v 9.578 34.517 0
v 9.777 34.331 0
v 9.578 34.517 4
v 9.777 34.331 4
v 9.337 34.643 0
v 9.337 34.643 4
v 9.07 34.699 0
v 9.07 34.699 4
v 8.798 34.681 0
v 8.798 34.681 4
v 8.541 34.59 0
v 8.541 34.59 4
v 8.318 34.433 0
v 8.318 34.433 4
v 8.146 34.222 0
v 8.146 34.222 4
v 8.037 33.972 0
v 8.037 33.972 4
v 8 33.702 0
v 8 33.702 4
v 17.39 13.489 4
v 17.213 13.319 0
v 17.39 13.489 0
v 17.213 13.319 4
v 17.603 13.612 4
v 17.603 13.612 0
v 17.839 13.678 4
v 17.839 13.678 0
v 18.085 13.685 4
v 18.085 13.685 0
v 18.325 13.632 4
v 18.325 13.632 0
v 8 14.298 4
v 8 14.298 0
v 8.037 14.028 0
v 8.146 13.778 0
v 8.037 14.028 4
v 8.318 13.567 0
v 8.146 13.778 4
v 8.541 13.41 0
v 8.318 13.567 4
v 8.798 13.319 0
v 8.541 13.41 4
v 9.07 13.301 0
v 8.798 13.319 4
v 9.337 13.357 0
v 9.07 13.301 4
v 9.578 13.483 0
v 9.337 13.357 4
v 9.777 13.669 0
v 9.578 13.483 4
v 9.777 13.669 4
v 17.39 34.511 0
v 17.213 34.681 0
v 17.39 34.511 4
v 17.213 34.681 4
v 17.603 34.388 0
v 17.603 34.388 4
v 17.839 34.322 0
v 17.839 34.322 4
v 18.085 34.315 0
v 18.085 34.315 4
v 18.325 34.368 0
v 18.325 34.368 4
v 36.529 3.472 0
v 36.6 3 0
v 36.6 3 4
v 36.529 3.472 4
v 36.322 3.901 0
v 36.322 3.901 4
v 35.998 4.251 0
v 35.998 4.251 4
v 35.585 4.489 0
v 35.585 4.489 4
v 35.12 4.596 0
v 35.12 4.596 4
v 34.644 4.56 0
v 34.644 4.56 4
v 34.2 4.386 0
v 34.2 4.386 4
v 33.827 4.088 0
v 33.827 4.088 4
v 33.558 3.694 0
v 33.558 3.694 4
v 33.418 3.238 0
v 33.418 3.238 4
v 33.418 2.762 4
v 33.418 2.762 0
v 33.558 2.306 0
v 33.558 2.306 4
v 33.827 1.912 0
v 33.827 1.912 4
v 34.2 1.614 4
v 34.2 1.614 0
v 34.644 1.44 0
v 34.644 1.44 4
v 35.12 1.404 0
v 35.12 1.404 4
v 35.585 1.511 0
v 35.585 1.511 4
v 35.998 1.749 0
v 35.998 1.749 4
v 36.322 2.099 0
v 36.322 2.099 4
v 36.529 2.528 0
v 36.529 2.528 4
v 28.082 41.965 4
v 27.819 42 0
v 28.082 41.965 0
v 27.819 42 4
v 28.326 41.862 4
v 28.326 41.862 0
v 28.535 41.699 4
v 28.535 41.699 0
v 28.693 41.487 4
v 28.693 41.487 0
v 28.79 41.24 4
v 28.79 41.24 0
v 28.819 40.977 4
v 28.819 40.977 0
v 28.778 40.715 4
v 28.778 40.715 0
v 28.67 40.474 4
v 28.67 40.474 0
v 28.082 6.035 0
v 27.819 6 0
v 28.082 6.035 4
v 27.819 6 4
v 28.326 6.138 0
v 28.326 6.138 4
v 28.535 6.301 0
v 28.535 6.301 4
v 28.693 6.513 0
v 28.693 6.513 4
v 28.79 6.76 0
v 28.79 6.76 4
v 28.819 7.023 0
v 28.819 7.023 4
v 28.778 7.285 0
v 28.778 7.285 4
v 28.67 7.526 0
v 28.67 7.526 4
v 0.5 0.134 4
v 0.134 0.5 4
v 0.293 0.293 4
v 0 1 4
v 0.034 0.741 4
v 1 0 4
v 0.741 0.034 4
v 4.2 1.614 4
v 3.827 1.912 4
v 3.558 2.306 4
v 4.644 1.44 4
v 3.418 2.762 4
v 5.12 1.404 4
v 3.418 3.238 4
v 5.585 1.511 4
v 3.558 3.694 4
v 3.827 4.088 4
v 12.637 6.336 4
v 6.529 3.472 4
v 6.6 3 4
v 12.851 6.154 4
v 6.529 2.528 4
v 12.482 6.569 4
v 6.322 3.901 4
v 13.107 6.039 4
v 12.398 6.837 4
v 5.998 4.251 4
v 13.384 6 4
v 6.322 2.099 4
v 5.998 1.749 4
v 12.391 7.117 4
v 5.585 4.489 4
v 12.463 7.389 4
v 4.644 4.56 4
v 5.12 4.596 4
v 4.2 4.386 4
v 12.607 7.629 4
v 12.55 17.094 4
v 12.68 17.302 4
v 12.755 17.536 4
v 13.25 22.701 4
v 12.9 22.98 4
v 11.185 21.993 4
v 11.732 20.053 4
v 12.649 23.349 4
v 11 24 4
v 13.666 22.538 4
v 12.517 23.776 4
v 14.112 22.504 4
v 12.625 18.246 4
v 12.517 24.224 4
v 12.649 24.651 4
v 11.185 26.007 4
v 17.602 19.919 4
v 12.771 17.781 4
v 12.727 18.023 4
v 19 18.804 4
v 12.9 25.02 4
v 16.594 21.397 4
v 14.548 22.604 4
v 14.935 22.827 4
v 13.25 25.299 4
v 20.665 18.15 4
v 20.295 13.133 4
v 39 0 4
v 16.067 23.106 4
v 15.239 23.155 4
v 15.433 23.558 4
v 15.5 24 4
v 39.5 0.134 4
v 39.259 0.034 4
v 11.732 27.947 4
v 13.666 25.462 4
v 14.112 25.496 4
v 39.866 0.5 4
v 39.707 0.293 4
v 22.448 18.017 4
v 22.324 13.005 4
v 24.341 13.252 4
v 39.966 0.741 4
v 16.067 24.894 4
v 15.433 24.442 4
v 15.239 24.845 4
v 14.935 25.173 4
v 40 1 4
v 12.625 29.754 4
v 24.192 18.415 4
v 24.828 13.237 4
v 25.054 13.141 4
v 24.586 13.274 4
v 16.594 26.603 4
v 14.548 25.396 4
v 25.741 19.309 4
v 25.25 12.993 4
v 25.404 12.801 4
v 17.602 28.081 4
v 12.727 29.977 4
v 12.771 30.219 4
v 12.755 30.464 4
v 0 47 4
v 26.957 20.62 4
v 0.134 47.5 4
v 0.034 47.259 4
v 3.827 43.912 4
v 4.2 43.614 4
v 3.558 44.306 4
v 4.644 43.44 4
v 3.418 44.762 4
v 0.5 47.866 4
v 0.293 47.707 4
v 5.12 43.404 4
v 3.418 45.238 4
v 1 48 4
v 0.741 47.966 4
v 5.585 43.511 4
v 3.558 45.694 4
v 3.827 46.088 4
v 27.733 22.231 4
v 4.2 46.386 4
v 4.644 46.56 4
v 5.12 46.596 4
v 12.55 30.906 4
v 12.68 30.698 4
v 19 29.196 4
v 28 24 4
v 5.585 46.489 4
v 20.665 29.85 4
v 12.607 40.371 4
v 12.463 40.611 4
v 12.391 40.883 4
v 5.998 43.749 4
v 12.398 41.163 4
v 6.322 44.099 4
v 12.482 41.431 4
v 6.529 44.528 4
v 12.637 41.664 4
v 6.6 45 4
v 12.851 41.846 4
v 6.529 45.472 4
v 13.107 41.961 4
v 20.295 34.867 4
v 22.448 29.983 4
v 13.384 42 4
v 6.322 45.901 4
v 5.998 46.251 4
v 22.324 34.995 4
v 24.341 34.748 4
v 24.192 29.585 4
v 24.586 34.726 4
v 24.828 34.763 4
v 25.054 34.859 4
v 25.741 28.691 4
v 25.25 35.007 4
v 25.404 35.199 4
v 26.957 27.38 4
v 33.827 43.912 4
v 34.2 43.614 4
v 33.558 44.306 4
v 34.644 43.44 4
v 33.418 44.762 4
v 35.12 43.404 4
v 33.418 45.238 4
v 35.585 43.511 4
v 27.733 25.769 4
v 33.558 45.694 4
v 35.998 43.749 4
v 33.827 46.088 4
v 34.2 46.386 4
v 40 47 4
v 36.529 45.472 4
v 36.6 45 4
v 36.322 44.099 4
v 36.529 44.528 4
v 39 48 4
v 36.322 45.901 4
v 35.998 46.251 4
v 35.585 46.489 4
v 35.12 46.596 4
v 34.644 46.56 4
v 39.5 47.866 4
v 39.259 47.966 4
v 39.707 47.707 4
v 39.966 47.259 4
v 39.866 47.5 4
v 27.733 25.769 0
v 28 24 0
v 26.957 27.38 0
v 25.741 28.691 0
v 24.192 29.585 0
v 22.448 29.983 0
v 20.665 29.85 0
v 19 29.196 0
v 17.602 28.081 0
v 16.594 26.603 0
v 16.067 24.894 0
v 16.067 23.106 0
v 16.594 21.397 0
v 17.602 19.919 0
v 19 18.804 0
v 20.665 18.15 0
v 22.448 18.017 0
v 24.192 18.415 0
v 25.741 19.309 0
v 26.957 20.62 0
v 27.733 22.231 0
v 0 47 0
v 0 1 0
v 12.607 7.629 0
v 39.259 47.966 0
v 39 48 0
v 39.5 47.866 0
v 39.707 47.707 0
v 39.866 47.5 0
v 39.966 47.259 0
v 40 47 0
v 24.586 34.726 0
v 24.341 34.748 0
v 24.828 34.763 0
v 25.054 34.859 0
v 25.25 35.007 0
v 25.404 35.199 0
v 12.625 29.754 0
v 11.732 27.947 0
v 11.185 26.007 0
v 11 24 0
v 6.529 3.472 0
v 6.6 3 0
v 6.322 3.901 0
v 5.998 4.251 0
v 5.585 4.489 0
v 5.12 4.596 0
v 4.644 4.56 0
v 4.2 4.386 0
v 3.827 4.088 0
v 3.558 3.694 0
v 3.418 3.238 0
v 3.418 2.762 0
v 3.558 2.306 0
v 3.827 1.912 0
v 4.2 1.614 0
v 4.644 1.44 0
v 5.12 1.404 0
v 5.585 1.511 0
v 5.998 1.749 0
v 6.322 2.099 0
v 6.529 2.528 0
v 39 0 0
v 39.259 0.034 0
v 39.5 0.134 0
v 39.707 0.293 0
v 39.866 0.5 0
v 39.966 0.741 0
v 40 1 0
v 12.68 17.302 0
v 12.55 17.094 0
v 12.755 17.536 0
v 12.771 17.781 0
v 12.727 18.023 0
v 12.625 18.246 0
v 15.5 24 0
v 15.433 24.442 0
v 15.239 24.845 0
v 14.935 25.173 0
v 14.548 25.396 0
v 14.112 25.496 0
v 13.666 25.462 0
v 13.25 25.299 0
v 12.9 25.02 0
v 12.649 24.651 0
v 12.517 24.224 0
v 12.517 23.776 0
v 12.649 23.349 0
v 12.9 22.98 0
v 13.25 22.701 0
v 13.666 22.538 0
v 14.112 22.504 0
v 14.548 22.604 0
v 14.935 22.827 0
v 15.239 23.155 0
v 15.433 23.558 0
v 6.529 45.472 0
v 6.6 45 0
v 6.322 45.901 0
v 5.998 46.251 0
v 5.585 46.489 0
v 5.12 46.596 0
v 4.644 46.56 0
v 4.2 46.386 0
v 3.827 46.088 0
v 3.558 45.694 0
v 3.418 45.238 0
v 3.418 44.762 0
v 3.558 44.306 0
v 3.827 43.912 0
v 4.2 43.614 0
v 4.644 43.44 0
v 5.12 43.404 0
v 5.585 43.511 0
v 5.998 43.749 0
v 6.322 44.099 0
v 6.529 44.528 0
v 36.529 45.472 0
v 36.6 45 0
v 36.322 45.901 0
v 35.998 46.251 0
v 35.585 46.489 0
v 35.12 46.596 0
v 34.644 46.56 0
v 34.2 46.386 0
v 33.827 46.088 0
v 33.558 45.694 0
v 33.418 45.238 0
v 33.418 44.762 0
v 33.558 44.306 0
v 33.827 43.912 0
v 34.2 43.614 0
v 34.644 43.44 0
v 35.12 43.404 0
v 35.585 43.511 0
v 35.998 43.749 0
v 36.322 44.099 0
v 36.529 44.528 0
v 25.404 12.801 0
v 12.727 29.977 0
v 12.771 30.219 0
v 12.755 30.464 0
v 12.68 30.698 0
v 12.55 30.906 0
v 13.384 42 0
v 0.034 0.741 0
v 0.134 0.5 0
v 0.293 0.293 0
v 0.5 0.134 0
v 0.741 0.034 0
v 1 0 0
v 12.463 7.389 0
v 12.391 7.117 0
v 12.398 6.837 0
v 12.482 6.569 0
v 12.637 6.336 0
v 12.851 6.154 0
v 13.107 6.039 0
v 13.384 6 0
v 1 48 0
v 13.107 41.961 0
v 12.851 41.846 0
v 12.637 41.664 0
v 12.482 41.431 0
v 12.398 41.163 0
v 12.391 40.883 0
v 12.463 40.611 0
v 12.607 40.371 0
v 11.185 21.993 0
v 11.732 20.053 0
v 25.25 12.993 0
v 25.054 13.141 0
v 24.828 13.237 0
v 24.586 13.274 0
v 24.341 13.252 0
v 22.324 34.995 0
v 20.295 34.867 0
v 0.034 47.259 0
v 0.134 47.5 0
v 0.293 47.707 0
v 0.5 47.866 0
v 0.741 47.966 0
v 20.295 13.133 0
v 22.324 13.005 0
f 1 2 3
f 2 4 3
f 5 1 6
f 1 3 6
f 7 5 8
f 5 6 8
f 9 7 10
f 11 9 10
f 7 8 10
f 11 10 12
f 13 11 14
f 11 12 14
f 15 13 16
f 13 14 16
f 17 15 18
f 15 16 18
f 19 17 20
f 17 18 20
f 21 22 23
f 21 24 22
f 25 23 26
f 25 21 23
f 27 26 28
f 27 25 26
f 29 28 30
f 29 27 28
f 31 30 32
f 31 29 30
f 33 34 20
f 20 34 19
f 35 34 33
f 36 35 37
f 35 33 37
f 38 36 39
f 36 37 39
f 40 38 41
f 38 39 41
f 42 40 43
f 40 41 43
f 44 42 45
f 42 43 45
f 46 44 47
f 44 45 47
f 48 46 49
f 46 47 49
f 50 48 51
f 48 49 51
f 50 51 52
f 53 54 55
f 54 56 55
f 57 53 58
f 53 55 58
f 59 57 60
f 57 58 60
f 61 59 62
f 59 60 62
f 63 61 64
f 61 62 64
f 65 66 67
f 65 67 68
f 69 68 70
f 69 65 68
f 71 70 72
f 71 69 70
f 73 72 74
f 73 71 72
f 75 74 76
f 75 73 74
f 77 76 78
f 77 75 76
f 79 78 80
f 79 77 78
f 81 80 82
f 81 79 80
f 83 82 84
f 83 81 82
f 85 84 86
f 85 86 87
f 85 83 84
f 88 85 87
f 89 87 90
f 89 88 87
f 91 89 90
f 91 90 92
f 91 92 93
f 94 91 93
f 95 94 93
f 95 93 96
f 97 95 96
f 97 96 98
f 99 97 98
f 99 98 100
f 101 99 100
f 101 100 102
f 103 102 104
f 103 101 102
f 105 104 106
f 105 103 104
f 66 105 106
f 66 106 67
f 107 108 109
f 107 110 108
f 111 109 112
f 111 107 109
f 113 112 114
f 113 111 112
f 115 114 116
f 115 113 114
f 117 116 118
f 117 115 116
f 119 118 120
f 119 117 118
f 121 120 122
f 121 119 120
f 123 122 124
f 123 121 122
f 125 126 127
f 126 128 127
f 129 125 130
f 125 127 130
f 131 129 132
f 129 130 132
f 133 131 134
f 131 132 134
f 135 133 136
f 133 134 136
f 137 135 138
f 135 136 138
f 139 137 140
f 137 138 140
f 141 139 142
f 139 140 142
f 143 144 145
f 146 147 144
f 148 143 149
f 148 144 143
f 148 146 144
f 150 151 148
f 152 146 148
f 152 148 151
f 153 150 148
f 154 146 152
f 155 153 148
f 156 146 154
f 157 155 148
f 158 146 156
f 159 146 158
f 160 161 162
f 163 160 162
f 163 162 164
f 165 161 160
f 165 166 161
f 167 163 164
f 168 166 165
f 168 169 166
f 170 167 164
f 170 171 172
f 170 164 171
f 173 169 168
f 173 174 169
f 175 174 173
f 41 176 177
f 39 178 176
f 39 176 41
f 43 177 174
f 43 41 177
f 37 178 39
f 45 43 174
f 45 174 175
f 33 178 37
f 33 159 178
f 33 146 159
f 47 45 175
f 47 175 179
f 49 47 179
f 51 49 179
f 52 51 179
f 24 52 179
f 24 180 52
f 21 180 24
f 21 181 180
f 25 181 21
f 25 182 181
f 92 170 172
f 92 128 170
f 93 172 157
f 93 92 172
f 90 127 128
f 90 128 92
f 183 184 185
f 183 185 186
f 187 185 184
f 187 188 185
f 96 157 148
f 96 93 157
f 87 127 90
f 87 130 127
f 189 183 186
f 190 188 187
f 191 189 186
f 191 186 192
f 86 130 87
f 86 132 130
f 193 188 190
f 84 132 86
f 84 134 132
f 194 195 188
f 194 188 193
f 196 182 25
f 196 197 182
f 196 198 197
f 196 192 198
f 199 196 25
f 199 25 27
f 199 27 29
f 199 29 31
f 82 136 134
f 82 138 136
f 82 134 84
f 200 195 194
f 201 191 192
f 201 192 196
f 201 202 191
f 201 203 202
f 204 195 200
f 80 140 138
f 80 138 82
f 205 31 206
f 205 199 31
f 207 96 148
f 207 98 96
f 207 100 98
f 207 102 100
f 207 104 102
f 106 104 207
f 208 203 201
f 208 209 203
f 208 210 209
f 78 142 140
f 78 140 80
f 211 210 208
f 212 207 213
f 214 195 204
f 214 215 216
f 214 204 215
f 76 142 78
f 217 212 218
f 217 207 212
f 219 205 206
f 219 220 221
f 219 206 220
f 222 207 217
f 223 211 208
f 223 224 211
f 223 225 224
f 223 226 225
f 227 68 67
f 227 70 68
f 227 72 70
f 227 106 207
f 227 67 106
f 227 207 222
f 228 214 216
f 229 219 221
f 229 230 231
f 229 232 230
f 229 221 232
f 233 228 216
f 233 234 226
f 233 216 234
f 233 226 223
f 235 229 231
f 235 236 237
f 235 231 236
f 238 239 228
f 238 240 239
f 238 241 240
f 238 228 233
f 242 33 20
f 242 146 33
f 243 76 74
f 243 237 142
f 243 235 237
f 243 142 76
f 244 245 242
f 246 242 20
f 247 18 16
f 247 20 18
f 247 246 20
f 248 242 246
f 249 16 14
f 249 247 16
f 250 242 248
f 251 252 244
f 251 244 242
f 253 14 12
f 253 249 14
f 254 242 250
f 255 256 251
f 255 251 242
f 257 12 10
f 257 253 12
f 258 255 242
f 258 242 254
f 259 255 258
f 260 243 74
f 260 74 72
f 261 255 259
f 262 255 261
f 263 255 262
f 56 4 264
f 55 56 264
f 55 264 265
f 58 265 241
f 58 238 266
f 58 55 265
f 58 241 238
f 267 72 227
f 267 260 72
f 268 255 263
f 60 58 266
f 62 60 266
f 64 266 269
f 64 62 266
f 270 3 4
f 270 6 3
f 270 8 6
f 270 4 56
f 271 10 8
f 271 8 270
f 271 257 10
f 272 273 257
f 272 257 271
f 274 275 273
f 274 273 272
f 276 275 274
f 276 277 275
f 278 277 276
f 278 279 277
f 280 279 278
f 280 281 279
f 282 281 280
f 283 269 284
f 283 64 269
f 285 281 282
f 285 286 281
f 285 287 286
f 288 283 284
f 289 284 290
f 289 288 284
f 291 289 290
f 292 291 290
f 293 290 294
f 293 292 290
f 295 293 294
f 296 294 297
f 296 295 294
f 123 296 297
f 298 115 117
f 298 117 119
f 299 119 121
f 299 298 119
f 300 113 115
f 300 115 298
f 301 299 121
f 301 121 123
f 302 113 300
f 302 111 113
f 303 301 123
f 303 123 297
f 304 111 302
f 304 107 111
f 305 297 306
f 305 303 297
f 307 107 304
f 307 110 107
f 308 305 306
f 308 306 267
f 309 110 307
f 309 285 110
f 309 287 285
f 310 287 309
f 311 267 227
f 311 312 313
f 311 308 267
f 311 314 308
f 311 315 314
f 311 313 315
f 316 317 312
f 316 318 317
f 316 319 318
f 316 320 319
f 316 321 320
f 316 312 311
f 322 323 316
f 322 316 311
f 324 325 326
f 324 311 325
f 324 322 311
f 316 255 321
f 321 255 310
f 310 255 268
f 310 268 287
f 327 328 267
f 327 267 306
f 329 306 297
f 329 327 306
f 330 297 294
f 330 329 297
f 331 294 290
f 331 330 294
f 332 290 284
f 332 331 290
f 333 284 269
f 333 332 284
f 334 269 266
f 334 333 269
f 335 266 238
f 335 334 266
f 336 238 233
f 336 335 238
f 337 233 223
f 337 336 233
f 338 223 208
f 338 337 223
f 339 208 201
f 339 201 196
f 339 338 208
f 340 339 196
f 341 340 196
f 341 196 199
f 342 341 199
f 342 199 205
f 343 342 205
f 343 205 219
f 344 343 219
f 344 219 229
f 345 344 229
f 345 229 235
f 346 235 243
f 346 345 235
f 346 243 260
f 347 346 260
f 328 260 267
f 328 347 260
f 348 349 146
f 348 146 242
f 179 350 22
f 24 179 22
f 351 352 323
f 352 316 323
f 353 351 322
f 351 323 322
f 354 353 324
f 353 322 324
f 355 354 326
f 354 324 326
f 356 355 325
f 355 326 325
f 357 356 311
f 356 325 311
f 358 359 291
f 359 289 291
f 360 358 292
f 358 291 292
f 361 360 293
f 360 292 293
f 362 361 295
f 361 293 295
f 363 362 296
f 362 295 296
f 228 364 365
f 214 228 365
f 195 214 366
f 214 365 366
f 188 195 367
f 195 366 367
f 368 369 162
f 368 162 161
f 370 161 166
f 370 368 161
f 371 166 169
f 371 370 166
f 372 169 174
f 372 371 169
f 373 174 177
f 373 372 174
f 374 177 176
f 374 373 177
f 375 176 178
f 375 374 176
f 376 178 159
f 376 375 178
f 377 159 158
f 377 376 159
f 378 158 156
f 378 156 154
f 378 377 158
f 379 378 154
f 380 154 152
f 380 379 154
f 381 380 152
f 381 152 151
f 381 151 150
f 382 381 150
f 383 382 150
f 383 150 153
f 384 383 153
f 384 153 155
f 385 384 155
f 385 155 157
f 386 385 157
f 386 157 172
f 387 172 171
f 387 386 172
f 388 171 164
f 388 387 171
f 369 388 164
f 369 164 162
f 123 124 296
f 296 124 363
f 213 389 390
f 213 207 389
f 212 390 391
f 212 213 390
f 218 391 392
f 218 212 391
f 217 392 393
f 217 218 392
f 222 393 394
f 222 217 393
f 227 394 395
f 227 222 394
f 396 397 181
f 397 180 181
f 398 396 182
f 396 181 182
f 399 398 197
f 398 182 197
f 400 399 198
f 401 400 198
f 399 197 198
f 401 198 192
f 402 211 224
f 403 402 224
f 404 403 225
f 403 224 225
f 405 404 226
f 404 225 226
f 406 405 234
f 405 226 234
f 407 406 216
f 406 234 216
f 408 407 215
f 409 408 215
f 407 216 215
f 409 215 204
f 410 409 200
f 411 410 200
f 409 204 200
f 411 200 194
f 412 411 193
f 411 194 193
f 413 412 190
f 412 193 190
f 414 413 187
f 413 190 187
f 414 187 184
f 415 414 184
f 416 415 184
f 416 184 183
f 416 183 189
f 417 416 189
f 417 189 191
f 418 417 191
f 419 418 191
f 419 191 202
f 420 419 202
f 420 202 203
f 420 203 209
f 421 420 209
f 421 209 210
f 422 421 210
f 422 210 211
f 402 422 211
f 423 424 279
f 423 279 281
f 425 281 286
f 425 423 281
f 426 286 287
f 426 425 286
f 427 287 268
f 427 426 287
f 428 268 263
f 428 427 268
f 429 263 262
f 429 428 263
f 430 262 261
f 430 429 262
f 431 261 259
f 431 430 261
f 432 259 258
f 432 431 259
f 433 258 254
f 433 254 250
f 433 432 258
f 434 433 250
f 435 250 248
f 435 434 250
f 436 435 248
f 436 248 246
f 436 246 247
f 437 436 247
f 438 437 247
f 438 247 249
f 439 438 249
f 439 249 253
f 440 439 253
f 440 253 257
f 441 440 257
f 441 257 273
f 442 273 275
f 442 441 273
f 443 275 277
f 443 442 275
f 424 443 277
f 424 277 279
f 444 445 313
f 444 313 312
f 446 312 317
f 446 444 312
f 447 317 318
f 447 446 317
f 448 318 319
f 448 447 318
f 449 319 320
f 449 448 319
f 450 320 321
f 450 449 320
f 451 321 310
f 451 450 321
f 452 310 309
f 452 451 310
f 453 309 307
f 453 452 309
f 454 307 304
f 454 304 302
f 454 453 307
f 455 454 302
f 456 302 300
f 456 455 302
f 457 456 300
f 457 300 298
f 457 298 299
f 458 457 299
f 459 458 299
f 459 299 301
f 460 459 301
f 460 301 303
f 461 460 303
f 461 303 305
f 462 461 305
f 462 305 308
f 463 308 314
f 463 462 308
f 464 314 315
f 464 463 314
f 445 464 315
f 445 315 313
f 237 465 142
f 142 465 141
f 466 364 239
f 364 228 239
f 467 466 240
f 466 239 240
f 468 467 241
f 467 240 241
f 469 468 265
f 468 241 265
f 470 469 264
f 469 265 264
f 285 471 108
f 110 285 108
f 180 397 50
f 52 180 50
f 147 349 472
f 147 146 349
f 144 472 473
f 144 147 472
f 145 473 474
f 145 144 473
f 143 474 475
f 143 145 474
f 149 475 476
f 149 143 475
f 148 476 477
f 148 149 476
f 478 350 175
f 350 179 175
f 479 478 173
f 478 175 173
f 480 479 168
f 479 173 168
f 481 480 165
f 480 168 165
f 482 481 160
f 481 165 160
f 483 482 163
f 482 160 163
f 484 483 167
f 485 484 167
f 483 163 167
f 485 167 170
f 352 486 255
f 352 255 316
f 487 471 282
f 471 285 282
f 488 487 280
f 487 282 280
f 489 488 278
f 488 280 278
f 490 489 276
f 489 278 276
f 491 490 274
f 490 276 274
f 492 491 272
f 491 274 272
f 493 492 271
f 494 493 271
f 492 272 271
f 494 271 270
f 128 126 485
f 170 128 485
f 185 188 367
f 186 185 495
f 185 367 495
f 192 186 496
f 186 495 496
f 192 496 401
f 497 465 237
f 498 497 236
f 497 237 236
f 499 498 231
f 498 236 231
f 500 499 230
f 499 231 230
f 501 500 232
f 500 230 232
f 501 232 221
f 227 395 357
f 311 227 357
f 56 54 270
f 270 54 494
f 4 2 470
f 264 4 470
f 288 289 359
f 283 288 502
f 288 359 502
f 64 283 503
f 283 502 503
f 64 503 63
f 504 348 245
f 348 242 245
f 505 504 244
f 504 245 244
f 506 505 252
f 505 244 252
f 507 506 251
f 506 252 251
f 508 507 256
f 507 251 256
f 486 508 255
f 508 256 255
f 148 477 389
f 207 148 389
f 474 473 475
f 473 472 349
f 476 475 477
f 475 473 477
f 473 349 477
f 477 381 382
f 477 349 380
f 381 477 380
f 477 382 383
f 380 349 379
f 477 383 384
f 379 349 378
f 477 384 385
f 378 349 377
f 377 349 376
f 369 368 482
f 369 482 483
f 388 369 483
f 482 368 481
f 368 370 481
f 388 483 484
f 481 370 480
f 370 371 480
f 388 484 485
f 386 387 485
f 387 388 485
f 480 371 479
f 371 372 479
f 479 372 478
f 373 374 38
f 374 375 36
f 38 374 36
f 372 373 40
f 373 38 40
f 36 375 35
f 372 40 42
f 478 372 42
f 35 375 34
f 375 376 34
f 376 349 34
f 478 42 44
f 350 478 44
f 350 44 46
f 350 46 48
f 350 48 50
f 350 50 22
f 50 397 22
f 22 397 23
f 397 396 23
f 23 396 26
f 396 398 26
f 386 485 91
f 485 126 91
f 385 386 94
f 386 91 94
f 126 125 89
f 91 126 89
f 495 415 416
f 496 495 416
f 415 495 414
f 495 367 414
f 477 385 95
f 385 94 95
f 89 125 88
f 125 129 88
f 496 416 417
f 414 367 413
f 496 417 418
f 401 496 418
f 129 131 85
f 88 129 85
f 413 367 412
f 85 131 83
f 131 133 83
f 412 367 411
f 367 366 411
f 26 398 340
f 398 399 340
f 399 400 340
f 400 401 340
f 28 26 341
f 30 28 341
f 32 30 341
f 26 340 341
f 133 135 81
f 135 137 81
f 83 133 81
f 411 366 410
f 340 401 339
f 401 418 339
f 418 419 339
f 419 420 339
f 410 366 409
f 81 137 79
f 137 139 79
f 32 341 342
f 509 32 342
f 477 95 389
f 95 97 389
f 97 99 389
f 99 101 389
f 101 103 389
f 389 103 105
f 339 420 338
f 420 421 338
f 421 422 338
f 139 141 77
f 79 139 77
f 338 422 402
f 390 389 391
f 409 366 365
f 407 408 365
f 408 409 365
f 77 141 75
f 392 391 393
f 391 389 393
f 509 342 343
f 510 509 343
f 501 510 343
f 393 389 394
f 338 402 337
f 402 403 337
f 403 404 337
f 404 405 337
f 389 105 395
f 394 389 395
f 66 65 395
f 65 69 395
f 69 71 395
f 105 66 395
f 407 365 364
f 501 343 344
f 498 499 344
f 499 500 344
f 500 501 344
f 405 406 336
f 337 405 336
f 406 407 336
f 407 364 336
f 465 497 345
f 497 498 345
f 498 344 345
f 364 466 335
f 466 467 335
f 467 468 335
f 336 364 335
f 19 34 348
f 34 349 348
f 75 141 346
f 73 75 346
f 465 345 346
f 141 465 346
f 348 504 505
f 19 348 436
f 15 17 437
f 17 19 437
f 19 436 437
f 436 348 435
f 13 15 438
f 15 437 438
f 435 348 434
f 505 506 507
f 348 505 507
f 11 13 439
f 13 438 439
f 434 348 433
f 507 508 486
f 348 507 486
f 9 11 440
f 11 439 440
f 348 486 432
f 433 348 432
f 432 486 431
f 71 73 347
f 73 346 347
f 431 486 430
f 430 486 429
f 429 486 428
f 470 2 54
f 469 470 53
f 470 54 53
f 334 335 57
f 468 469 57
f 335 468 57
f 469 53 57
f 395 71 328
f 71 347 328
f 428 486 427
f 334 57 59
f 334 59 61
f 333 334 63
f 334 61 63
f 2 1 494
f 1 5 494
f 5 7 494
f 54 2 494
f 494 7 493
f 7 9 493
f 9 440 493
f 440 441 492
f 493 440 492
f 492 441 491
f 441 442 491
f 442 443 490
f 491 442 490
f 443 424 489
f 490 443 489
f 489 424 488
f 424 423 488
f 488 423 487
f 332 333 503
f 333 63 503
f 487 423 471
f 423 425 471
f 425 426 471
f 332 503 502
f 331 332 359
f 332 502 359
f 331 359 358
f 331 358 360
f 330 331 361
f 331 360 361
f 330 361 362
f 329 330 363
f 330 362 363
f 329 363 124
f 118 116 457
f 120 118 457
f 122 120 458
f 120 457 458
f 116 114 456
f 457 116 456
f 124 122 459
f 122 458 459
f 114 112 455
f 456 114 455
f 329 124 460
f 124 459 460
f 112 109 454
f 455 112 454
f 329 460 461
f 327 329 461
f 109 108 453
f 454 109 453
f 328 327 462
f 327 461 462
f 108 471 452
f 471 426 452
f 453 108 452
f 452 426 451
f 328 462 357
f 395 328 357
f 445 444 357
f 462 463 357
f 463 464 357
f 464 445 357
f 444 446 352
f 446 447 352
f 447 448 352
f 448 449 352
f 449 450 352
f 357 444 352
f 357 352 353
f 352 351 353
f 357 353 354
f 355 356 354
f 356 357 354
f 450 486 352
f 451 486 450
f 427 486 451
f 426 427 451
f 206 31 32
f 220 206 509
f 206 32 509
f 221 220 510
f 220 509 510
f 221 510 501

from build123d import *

# Parameters (mm, degrees)
SKETCH_1_W          = 40
SKETCH_1_H          = 48
SKETCH_1_R          = 1.6
SKETCH_1_R_2        = 6
EXTRUDE_1_DEPTH     = 4
SKETCH_3_R          = 1.5
CUT_EXTRUDE_1_DEPTH = 63.60990337
CUT_EXTRUDE_2_DEPTH = 10
FILLET_1_R          = 1


with BuildPart() as part:
    # ｽｹｯﾁ1 → ﾎﾞｽ - 押し出し1 (new body)
    with BuildSketch(Plane.XY):
        with Locations((20, 24)):
            Rectangle(SKETCH_1_W, SKETCH_1_H)
        with Locations((5, 45)):
            Circle(SKETCH_1_R, mode=Mode.SUBTRACT)
        with Locations((5, 3)):
            Circle(SKETCH_1_R, mode=Mode.SUBTRACT)
        with Locations((35, 45)):
            Circle(SKETCH_1_R, mode=Mode.SUBTRACT)
        with Locations((35, 3)):
            Circle(SKETCH_1_R, mode=Mode.SUBTRACT)
        with Locations((22, 24)):
            Circle(SKETCH_1_R_2, mode=Mode.SUBTRACT)
    extrude(amount=EXTRUDE_1_DEPTH)

    # ｽｹｯﾁ3 → ｶｯﾄ - 押し出し1 (cut, through all)
    with BuildSketch(Plane.XY.offset(4)):
        with Locations((14, 24)):
            Circle(SKETCH_3_R)
    extrude(amount=-CUT_EXTRUDE_1_DEPTH, mode=Mode.SUBTRACT)

    # ｽｹｯﾁ4 → ｶｯﾄ - 押し出し2 (cut)
    with BuildSketch(Plane(origin=(0, 0, 0), x_dir=(-1, 0, 0), z_dir=(0, 0, -1))):
        with BuildLine():
            Line((-29.61454599, 42), (-25.019618207, 34.57742435))
            ThreePointArc((-25.019618207, 34.57742435), (-21.306285158, 34.978103649), (-17.672926458, 34.113181229))
            Line((-17.672926458, 34.113181229), (-11.288358882, 42))
            Line((-11.288358882, 42), (-29.61454599, 42))
        make_face()
        with BuildLine():
            ThreePointArc((-11, 24), (-11.514391519, 20.675542933), (-13.009457234, 17.662008143))
            Line((-13.009457234, 17.662008143), (-8, 11.473855089))
            Line((-8, 11.473855089), (-8, 36.526144911))
            Line((-8, 36.526144911), (-13.009457234, 30.337991857))
            ThreePointArc((-13.009457234, 30.337991857), (-11.514391519, 27.324457067), (-11, 24))
        make_face()
        with BuildLine():
            ThreePointArc((-17.672926458, 13.886818771), (-21.306285158, 13.021896351), (-25.019618207, 13.42257565))
            Line((-25.019618207, 13.42257565), (-29.61454599, 6))
            Line((-29.61454599, 6), (-11.288358882, 6))
            Line((-11.288358882, 6), (-17.672926458, 13.886818771))
        make_face()
    extrude(amount=-CUT_EXTRUDE_2_DEPTH, mode=Mode.SUBTRACT)

    # ﾌｨﾚｯﾄ1
    fillet_1_edges = [part.edges().sort_by_distance(p)[0] for p in [
        (13.009457234, 17.662008143, 2),
        (13.009457234, 30.337991857, 2),
        (8, 36.526144911, 2),
        (8, 11.473855089, 2),
        (25.019618207, 13.42257565, 2),
        (17.672926458, 13.886818771, 2),
        (11.288358882, 6, 2),
        (29.61454599, 6, 2),
        (17.672926458, 34.113181229, 2),
        (25.019618207, 34.57742435, 2),
        (29.61454599, 42, 2),
        (11.288358882, 42, 2),
        (0, 48, 2),
        (40, 48, 2),
        (40, 0, 2),
        (0, 0, 2),
    ]]
    fillet(fillet_1_edges, radius=FILLET_1_R)


solid = part.part
